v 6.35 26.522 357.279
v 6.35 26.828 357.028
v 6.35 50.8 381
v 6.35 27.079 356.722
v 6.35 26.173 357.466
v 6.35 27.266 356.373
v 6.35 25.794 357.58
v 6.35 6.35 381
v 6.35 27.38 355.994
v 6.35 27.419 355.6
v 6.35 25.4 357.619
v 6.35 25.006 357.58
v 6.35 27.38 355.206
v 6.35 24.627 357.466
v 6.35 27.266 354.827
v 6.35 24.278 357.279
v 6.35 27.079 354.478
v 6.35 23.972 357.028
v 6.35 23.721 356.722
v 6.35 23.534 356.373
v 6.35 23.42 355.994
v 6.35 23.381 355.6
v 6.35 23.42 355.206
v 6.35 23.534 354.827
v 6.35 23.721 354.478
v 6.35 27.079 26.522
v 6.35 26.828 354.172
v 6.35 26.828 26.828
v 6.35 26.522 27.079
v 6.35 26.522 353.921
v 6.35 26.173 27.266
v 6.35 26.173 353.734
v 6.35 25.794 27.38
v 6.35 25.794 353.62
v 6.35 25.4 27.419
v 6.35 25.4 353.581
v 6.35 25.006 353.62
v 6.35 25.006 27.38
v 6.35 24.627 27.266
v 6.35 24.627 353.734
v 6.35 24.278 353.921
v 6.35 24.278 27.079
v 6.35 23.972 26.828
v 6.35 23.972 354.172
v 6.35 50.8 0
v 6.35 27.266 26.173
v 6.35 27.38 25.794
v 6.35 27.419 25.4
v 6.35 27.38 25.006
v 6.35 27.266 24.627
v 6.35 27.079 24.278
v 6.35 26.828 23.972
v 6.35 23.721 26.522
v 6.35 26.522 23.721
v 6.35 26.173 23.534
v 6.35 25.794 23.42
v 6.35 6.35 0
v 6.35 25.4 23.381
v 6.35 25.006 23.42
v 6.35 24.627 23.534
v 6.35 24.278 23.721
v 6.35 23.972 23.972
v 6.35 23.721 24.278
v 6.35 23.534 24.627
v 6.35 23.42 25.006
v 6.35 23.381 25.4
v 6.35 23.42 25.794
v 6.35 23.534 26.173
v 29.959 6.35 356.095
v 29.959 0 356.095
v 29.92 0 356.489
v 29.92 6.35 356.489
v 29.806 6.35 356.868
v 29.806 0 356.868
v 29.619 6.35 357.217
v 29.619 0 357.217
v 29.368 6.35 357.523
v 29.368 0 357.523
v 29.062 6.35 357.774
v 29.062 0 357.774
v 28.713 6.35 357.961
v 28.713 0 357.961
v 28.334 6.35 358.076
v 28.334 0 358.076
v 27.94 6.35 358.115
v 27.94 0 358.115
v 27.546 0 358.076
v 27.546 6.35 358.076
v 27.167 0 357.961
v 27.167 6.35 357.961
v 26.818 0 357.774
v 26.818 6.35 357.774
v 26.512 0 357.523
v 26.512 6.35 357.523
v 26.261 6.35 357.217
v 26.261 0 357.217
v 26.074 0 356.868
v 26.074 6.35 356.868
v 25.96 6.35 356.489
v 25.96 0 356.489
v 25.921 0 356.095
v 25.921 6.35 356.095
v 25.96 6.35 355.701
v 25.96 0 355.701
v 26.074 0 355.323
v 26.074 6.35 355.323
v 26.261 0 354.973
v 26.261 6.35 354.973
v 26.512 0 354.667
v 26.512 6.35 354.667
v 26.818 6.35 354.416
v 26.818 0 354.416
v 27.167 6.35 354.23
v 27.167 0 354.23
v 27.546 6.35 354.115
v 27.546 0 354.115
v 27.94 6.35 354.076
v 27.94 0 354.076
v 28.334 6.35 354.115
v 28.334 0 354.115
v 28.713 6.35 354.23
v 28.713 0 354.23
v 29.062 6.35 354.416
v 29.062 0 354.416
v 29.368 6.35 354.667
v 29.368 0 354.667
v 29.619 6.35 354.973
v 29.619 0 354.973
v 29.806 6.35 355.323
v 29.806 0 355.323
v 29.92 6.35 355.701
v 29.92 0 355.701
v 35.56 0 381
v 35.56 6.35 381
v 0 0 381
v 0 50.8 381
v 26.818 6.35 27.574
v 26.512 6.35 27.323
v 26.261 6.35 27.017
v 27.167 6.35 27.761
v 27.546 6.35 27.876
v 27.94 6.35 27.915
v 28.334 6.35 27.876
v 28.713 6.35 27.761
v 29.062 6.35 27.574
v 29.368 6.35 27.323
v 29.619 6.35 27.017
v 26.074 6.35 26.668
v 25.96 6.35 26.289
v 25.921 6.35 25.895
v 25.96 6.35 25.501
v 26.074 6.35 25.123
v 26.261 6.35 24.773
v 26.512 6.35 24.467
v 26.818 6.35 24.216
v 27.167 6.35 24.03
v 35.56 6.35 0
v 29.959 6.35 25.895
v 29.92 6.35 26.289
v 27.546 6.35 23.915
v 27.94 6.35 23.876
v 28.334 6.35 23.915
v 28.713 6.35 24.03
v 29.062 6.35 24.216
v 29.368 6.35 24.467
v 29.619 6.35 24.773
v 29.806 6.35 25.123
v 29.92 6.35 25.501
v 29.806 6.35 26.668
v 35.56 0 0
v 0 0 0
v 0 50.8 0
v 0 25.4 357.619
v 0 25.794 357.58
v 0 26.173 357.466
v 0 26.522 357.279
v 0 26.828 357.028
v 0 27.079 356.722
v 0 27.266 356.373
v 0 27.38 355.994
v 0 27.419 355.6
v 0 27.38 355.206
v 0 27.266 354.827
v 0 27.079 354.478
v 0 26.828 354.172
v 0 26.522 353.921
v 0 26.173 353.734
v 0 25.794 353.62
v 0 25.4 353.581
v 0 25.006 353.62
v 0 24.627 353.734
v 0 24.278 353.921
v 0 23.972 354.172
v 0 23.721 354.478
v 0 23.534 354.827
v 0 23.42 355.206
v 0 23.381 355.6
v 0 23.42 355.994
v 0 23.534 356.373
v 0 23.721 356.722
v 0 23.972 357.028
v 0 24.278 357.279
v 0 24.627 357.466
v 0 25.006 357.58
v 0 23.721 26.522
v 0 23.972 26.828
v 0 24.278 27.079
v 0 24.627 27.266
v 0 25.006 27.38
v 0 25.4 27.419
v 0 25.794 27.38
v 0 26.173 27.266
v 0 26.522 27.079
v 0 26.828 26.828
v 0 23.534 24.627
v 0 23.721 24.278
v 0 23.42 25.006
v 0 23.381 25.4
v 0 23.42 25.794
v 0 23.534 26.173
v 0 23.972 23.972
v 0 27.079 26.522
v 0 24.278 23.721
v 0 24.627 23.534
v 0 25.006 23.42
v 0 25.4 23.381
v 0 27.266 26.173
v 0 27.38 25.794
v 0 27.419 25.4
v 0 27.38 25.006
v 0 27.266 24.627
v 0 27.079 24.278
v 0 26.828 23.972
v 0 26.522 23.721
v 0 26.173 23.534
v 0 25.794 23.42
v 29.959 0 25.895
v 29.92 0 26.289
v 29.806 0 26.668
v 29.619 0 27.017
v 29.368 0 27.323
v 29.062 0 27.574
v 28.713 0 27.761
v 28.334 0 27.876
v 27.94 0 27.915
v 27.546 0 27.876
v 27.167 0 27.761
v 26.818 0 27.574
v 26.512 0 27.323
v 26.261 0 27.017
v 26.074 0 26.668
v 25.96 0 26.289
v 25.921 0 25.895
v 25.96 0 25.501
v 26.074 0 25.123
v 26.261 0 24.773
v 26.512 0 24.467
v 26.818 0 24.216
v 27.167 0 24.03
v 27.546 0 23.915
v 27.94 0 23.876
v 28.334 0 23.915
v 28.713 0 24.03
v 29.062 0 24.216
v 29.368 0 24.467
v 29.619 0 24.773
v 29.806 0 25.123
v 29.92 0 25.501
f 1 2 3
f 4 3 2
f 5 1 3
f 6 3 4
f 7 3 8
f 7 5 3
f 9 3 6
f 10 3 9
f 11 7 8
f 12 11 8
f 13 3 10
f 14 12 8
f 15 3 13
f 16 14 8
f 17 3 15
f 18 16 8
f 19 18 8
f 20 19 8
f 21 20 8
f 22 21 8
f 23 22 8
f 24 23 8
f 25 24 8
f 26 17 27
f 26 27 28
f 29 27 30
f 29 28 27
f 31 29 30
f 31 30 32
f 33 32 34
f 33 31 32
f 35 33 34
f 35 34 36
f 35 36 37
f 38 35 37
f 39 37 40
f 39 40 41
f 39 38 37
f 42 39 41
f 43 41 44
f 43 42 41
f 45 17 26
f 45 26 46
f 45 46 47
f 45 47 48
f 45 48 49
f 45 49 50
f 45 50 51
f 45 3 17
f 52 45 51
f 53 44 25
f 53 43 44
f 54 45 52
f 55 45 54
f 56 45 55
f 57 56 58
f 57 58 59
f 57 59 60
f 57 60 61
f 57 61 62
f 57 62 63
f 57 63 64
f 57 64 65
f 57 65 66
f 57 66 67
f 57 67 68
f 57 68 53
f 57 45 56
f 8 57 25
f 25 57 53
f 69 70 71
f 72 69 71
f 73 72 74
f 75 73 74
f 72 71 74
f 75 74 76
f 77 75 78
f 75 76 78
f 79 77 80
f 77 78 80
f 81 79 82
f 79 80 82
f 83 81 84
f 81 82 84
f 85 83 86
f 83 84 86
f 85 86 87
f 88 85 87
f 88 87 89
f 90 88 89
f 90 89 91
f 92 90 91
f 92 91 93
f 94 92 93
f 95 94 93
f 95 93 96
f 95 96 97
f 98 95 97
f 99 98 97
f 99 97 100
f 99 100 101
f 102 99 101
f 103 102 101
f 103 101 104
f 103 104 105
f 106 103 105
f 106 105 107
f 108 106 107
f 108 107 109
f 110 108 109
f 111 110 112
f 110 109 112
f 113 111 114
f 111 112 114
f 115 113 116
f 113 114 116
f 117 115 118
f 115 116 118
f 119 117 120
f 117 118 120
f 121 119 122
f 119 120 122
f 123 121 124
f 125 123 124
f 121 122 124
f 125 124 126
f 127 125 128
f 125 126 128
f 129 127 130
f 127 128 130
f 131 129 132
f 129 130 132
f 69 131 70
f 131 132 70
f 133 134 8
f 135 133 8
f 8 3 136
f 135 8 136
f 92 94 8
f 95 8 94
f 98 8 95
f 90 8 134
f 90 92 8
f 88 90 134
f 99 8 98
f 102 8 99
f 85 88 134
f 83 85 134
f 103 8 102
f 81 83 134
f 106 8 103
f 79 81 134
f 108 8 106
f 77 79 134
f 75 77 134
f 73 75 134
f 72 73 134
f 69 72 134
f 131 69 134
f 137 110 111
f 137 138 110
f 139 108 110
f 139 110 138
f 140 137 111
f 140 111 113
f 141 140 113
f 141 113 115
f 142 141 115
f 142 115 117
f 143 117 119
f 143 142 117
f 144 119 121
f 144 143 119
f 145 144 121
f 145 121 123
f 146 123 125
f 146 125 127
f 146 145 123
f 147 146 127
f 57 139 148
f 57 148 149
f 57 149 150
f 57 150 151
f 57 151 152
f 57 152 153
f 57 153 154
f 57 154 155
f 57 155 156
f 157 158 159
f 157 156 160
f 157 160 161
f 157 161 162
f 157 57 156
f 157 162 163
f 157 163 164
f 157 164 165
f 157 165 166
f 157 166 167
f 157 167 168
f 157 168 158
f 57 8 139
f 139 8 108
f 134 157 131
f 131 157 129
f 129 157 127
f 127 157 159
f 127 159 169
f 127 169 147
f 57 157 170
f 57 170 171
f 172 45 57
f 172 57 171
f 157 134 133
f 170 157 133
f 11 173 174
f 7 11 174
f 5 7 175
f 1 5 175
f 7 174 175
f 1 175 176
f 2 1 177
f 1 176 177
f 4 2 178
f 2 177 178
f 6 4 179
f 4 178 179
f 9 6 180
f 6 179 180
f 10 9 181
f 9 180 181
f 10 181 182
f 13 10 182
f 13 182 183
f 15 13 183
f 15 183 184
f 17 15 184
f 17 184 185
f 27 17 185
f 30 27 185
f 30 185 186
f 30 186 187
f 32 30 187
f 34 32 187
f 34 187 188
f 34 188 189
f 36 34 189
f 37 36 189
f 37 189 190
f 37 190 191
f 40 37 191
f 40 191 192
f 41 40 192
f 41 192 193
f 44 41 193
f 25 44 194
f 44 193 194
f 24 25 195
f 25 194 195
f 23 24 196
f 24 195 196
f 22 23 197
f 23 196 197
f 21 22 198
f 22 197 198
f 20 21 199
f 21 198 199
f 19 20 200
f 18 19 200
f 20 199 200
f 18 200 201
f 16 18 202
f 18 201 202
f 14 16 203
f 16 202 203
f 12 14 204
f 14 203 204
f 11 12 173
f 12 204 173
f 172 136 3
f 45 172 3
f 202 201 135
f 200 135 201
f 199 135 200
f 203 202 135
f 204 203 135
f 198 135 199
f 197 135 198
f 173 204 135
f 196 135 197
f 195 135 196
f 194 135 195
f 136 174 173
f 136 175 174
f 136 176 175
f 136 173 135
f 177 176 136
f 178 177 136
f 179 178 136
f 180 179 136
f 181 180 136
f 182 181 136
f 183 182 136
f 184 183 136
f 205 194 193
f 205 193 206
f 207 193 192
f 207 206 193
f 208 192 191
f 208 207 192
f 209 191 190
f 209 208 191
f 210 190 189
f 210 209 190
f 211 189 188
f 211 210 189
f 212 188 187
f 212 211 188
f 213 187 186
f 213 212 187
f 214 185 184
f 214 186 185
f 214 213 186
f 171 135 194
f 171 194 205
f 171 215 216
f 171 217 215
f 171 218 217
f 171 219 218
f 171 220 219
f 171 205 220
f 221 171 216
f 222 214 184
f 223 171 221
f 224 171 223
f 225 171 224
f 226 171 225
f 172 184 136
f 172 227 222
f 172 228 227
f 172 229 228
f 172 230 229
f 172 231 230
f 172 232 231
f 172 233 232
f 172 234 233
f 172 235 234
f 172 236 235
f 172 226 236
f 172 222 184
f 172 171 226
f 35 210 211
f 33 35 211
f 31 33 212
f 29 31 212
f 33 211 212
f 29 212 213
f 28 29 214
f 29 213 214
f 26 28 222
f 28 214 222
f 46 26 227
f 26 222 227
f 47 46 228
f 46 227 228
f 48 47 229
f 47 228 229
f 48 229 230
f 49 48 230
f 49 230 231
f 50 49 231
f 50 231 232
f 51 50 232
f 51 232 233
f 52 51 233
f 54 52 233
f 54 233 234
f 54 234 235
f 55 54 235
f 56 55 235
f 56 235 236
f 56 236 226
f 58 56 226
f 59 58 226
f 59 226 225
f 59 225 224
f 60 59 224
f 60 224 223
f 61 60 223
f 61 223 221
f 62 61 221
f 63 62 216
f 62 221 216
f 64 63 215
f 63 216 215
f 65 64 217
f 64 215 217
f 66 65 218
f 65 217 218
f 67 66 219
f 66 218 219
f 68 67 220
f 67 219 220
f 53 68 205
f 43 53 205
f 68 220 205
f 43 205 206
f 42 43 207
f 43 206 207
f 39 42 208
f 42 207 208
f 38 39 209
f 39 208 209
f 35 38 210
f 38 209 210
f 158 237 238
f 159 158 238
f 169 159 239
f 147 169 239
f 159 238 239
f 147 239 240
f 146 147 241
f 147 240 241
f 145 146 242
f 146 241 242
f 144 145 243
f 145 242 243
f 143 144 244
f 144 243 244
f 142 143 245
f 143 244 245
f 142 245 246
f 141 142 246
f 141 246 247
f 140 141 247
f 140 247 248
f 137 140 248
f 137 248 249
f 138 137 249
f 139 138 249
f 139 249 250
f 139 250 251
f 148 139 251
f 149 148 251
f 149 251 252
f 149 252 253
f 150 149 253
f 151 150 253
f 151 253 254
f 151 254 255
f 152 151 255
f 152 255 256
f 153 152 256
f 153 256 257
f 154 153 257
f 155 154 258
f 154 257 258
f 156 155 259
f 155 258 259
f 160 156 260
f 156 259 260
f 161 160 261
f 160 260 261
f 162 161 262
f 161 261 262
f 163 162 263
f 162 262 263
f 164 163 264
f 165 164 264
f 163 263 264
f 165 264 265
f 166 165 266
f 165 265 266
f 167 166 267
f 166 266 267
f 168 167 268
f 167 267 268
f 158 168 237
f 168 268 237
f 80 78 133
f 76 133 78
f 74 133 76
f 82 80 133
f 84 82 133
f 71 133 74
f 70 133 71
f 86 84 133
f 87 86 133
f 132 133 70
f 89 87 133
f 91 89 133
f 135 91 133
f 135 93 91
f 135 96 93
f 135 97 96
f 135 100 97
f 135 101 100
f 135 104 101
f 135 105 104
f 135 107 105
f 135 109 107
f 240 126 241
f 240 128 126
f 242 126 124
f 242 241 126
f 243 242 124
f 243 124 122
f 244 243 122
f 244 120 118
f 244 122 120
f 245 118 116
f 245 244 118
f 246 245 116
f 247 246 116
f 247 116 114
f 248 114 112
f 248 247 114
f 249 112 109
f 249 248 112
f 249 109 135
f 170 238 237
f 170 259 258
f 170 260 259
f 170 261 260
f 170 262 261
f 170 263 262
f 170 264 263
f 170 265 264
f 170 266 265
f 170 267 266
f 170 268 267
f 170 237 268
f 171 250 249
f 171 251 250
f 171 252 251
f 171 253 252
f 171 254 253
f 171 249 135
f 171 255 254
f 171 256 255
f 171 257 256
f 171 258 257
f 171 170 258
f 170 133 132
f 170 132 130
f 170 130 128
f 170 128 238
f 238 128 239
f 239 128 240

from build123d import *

# Parameters (mm, degrees)
BOSS_EXTRUDE1_DEPTH    = 381
F_10_32_TAPPED_HOLE5_D = 4.0386
F_10_32_TAPPED_HOLE6_D = 4.0386


with BuildPart() as part:
    # Sketch1 → Boss-Extrude1 (new body)
    with BuildSketch(Plane.XY):
        Polygon((0, 0), (0, 50.8), (6.35, 50.8), (6.35, 6.35), (35.56, 6.35), (35.56, 0), align=None)
    extrude(amount=BOSS_EXTRUDE1_DEPTH)

    # #10-32 Tapped Hole5 (through all)
    with Locations(Plane(origin=(6.35, 0, 0), x_dir=(0, 0, -1), z_dir=(1, 0, 0))):
        with Locations((-355.6, 25.4), (-25.4, 25.4)):
            Hole(F_10_32_TAPPED_HOLE5_D / 2)

    # #10-32 Tapped Hole6 (through all)
    with Locations(Plane(origin=(0, 6.35, 0), x_dir=(-1, 0, 0), z_dir=(0, 1, 0))):
        with Locations((-27.94, 356.095307591), (-27.94, 25.895307591)):
            Hole(F_10_32_TAPPED_HOLE6_D / 2)


solid = part.part
